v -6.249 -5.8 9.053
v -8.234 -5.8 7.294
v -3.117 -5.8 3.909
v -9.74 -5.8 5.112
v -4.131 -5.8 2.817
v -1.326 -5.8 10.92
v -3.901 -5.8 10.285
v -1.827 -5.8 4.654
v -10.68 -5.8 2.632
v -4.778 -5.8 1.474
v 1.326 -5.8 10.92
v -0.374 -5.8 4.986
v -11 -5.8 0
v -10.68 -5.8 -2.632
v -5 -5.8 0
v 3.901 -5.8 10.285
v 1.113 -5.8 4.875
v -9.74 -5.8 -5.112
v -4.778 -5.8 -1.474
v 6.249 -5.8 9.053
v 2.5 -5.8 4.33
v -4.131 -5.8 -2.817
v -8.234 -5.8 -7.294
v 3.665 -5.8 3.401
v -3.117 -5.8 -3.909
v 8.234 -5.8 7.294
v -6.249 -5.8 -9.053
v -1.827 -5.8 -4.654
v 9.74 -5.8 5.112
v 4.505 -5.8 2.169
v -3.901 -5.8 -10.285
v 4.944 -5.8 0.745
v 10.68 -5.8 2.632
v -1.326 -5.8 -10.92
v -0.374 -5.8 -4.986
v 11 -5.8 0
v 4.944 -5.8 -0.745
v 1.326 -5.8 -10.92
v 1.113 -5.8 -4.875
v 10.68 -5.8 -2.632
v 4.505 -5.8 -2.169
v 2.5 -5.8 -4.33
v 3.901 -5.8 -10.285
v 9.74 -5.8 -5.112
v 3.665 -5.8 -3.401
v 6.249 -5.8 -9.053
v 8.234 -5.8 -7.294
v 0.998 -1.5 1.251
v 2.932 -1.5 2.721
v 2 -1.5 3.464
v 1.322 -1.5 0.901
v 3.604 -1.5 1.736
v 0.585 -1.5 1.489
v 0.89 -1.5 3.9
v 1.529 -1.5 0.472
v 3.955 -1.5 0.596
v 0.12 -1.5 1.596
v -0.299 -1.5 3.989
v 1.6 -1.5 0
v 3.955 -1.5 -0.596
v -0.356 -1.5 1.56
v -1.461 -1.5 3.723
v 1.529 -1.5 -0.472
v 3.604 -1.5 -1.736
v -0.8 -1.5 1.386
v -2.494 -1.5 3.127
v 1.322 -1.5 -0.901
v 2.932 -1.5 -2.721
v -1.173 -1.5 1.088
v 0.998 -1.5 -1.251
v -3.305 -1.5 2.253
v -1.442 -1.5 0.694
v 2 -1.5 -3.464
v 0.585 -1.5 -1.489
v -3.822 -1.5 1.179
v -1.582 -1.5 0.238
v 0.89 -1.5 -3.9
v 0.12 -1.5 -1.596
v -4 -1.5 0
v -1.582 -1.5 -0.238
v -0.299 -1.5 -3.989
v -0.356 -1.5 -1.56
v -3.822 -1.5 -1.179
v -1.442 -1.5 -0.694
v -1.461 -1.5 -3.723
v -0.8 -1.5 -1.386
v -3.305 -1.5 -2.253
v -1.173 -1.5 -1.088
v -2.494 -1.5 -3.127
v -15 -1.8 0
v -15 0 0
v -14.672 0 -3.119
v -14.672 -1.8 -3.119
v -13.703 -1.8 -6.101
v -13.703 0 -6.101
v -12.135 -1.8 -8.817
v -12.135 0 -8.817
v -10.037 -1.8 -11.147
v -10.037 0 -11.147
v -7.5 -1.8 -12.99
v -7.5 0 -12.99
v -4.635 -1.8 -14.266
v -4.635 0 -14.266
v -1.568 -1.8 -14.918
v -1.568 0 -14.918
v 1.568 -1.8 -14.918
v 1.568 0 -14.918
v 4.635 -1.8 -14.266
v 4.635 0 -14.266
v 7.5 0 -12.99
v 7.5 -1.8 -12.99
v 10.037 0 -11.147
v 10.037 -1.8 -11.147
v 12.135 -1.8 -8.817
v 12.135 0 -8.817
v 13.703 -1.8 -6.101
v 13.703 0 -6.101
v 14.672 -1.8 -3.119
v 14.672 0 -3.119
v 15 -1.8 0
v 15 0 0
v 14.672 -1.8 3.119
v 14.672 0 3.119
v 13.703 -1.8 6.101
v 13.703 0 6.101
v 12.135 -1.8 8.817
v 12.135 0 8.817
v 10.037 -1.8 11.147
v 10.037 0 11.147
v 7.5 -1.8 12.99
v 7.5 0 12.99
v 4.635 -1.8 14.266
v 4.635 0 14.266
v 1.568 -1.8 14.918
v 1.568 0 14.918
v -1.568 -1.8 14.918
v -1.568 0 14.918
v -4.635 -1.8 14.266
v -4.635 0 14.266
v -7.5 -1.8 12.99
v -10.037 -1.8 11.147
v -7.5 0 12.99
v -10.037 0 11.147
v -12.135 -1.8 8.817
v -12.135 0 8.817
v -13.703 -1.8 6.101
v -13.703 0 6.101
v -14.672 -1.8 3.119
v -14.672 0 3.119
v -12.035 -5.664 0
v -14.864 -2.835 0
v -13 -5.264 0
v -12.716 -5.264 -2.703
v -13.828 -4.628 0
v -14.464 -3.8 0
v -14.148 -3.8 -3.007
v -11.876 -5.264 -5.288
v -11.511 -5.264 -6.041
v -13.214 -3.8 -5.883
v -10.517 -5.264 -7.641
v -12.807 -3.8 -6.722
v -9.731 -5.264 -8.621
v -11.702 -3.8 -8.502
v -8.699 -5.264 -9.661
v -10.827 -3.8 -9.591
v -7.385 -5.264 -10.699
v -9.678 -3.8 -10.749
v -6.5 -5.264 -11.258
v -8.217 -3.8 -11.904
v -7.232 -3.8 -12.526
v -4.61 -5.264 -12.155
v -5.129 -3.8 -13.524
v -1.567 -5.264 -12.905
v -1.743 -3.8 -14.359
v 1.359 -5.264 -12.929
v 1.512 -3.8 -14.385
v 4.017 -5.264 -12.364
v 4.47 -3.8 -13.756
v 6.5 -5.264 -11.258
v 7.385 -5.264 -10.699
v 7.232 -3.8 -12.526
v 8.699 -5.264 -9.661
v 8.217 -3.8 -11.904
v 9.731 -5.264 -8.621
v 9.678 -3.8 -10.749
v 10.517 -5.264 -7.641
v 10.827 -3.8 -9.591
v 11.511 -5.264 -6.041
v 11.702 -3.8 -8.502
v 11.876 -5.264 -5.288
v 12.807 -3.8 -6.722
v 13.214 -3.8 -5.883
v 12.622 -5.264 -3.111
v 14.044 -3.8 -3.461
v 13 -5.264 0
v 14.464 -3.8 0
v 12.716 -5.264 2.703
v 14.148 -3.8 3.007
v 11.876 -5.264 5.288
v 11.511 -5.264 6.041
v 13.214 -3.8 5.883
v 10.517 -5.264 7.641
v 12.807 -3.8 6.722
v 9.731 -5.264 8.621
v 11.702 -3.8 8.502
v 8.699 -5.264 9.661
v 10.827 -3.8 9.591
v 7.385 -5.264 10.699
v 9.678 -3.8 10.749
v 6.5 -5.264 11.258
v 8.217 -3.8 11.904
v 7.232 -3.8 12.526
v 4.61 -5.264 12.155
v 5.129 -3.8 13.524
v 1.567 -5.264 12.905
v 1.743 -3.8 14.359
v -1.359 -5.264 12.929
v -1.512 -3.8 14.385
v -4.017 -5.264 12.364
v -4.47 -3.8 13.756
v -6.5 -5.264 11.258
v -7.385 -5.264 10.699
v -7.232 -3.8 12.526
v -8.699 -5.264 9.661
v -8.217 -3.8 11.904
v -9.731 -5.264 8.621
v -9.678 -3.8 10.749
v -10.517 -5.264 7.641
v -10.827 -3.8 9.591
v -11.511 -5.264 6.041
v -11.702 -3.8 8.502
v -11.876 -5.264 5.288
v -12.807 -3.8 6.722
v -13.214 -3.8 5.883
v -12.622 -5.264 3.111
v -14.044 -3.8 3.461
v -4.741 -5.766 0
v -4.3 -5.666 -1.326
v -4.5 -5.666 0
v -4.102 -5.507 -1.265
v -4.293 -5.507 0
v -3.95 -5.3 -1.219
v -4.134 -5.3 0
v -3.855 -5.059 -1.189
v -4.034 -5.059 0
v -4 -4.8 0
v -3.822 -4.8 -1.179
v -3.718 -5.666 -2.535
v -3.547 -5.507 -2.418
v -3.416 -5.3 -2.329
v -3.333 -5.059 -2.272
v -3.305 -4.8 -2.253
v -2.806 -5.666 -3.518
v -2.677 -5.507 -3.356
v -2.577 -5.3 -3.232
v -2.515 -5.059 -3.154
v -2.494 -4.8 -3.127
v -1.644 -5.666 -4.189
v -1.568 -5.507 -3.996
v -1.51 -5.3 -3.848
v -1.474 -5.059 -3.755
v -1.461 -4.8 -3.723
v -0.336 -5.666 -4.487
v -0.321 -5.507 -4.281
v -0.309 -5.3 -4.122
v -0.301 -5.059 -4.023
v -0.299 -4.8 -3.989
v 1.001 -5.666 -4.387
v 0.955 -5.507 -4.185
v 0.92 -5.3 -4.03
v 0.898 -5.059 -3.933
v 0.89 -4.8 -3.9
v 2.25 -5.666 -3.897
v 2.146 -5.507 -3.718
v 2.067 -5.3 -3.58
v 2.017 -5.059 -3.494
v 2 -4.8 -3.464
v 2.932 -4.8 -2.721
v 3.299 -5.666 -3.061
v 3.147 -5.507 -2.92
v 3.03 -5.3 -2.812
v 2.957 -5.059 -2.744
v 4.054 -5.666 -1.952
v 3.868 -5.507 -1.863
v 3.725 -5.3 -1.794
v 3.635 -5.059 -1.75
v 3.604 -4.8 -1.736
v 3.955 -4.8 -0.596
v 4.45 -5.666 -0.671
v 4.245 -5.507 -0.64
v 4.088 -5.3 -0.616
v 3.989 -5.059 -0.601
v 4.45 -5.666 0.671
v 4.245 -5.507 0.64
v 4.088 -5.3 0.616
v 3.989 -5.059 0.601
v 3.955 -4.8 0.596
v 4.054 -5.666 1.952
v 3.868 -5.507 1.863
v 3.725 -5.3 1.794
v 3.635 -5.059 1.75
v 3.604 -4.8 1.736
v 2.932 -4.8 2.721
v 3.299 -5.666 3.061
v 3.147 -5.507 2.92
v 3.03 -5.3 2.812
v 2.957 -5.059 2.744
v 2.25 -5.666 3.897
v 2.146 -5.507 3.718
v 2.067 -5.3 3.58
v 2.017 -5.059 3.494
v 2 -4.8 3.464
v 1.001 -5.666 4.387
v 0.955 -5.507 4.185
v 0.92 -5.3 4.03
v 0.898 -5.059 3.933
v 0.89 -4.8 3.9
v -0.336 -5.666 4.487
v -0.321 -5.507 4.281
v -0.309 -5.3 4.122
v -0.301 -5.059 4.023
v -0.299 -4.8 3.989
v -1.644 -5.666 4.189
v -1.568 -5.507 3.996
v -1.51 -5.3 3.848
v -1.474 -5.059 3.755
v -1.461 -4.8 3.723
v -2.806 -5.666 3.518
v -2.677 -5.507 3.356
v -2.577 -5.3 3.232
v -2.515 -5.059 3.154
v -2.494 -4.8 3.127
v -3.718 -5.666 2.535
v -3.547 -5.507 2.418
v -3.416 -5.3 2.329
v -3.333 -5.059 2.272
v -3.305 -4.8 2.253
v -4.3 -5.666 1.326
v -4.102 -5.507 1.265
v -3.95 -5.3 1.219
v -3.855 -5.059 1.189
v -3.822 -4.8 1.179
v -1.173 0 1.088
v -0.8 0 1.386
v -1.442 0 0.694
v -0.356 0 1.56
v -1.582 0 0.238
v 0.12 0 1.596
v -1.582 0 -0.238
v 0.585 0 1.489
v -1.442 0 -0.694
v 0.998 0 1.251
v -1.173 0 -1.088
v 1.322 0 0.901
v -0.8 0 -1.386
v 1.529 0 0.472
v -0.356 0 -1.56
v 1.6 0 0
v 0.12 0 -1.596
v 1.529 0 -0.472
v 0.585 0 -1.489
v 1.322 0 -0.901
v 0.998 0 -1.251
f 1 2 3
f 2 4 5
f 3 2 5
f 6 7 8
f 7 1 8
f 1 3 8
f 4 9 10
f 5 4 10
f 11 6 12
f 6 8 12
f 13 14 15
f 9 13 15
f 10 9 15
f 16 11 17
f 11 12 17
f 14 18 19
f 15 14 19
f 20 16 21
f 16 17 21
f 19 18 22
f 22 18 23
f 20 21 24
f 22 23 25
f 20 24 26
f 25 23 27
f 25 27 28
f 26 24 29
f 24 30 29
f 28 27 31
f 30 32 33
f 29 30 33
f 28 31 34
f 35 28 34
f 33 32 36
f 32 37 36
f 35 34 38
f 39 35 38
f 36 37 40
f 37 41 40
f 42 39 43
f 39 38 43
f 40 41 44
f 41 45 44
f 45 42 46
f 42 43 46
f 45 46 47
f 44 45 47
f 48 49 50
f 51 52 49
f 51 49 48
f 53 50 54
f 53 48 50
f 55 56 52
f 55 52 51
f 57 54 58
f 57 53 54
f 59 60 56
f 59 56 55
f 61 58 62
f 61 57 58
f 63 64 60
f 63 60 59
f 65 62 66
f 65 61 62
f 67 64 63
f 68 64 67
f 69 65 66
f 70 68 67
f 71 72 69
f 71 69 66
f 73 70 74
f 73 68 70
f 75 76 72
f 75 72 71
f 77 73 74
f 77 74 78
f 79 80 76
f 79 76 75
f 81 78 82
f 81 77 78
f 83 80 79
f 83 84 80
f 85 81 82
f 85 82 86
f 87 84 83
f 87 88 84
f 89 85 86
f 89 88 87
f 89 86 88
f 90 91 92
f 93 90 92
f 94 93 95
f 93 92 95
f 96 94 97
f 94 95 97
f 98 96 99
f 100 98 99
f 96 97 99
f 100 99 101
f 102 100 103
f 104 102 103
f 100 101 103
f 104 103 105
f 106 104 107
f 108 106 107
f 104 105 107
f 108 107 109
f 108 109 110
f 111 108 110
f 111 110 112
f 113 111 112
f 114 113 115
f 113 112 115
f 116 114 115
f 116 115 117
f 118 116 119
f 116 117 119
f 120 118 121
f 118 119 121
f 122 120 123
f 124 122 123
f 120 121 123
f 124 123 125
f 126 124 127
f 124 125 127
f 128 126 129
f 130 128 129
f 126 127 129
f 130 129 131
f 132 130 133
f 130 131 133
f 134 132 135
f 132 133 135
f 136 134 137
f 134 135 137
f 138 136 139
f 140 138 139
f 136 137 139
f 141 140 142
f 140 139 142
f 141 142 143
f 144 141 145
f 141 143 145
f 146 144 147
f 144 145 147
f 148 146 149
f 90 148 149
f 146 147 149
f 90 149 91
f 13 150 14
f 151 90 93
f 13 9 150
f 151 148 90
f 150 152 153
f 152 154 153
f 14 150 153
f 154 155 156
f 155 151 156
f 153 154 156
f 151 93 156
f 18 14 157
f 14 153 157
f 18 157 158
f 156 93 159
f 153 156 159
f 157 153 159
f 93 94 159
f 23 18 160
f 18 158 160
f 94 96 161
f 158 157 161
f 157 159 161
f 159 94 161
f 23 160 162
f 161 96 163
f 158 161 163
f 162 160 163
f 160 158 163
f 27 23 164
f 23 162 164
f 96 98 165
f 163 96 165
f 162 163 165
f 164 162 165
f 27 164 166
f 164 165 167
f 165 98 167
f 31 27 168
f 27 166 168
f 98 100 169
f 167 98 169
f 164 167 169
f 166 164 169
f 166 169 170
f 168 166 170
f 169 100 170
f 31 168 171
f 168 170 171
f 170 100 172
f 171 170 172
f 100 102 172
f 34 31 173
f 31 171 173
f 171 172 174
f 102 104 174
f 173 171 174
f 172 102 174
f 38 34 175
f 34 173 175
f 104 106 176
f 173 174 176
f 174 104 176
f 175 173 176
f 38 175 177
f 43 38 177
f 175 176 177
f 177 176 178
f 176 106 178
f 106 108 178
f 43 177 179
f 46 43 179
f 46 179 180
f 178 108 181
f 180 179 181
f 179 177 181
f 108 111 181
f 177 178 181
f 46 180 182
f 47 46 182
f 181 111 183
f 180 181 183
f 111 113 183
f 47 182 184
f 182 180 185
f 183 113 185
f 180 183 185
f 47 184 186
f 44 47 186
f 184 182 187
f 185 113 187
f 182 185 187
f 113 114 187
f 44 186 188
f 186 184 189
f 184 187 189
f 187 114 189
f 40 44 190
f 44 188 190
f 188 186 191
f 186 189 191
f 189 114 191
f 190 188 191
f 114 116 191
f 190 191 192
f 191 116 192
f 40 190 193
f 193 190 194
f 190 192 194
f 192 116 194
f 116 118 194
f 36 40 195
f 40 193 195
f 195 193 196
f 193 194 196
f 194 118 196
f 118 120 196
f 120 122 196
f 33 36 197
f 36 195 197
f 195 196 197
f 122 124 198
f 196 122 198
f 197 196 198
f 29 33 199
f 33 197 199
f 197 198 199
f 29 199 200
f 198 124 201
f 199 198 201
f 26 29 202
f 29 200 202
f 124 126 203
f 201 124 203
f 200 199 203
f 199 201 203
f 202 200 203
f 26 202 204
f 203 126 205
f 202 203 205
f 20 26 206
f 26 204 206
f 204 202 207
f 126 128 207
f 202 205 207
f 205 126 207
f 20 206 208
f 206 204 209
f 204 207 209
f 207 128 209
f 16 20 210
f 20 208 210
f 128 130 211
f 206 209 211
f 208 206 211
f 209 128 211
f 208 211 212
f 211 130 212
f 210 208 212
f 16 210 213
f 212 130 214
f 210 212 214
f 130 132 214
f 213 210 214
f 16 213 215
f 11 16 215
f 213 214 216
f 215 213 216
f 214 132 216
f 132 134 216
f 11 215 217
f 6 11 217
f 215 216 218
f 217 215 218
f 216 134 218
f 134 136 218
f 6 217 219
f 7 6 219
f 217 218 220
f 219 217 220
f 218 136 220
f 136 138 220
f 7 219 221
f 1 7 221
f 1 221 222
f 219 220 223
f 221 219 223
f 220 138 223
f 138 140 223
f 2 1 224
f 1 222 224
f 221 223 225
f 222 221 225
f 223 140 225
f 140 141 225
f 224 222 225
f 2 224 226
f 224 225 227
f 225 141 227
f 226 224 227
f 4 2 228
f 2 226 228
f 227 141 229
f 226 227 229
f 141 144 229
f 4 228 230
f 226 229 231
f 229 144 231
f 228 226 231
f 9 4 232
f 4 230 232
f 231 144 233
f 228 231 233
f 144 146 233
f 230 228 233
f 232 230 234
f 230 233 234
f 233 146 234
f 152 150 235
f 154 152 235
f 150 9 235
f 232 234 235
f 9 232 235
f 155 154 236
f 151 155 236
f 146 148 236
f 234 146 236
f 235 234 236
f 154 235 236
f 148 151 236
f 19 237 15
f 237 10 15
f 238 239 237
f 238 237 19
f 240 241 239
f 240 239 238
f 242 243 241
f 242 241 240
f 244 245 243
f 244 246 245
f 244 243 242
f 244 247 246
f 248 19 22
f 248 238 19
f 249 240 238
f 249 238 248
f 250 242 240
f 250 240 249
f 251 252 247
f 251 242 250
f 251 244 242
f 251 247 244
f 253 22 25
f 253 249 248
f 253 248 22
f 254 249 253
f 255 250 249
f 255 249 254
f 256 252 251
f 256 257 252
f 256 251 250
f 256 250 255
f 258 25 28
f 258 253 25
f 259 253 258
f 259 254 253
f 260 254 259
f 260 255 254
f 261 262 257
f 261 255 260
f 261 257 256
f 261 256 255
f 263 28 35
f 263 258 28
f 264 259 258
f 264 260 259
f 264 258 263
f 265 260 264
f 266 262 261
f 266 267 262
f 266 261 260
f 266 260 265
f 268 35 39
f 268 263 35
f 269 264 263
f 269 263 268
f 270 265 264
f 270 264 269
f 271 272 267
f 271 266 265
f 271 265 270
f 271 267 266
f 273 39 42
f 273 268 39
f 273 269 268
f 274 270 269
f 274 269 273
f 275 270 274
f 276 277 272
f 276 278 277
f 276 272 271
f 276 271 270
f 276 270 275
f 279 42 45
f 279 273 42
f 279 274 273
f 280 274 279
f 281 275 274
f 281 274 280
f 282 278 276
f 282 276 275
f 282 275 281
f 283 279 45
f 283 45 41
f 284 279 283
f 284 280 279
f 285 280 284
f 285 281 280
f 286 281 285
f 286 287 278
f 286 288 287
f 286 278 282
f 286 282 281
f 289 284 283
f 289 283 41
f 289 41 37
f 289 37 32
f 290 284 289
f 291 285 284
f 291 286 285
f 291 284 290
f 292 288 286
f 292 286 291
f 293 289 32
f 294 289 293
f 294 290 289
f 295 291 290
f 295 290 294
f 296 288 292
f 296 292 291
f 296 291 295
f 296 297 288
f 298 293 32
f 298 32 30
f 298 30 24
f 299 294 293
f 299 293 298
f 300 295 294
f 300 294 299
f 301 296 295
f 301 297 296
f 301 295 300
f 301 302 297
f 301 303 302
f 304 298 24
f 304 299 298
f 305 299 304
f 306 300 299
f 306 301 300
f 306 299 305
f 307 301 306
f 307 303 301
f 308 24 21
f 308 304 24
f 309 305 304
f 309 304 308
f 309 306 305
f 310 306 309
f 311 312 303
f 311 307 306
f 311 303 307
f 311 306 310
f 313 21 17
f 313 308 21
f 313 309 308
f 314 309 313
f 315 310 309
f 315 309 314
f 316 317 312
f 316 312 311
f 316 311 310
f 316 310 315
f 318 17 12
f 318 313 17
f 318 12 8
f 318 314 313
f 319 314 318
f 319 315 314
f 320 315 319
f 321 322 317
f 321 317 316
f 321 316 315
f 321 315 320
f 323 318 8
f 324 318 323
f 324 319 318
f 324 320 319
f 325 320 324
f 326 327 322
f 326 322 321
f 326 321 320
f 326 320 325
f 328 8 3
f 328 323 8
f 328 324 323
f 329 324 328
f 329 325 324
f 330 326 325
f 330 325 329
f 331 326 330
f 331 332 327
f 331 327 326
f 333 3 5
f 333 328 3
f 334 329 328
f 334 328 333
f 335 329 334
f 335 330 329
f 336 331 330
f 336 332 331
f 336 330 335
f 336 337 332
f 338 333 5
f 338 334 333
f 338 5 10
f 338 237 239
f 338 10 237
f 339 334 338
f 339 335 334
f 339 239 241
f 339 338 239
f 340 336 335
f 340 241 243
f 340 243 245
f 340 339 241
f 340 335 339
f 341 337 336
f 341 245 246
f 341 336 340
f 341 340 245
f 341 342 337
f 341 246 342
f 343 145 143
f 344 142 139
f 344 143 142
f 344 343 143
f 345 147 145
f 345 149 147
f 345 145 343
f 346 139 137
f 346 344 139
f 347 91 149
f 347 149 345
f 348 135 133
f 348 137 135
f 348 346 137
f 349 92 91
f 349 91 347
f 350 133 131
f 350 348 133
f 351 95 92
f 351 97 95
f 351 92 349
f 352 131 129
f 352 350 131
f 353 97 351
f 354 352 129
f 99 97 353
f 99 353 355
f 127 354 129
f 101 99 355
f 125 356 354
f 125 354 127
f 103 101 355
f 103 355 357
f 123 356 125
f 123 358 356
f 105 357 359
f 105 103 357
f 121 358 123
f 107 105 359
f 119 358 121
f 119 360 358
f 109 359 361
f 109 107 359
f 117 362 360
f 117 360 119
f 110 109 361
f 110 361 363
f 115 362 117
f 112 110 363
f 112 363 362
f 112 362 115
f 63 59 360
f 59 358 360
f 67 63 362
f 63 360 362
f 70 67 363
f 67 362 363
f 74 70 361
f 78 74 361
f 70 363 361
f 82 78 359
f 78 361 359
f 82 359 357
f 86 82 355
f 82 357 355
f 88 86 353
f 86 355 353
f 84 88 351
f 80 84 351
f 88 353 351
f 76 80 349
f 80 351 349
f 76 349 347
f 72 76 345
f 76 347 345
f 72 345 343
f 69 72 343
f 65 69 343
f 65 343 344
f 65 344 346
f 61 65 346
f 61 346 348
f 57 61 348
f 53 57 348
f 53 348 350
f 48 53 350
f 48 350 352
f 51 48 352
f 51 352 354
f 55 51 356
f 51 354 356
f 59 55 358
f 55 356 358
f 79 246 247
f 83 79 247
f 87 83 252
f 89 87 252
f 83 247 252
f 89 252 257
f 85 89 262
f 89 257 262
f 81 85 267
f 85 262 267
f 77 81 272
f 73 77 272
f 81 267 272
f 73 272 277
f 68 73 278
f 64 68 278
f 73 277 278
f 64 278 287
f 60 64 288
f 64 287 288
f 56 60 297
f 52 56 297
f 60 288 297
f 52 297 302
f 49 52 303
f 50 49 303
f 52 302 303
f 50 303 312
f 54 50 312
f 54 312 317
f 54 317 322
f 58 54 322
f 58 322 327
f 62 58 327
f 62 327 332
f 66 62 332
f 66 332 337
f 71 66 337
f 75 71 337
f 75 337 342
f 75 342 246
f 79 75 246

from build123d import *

# Parameters (mm, degrees)
SKETCH1_W                      = 15
SKETCH1_H                      = 5.8
CBORE_FOR_M3_SHCS1_D           = 3.2
CBORE_FOR_M3_SHCS1_CBORE_D     = 8
CBORE_FOR_M3_SHCS1_CBORE_DEPTH = 4.3
FILLET2_R                      = 4
FILLET3_R                      = 1


with BuildPart() as part:
    # Sketch1 → Revolve1 (revolve)
    with BuildSketch(Plane.XY, mode=Mode.PRIVATE) as revolve1_sk:
        with Locations((7.5, -2.9)):
            Rectangle(SKETCH1_W, SKETCH1_H)
    revolve(revolve1_sk.sketch.rotate(Axis((0, 0, 0), (0, -1, 0)), 180), axis=Axis((0, 0, 0), (0, -1, 0)))

    # CBORE for M3 SHCS1 (through all)
    with Locations(Plane(origin=(0, -5.8, 0), x_dir=(-1, 0, 0), z_dir=(0, -1, 0))):
        with Locations((0, 0)):
            CounterBoreHole(CBORE_FOR_M3_SHCS1_D / 2, CBORE_FOR_M3_SHCS1_CBORE_D / 2, CBORE_FOR_M3_SHCS1_CBORE_DEPTH)

    # Fillet2
    fillet2_edges = [part.edges().sort_by_distance(p)[0] for p in [
        (15, -5.8, 0),
    ]]
    fillet(fillet2_edges, radius=FILLET2_R)

    # Fillet3
    fillet3_edges = [part.edges().sort_by_distance(p)[0] for p in [
        (4, -5.8, 0),
    ]]
    fillet(fillet3_edges, radius=FILLET3_R)


solid = part.part
